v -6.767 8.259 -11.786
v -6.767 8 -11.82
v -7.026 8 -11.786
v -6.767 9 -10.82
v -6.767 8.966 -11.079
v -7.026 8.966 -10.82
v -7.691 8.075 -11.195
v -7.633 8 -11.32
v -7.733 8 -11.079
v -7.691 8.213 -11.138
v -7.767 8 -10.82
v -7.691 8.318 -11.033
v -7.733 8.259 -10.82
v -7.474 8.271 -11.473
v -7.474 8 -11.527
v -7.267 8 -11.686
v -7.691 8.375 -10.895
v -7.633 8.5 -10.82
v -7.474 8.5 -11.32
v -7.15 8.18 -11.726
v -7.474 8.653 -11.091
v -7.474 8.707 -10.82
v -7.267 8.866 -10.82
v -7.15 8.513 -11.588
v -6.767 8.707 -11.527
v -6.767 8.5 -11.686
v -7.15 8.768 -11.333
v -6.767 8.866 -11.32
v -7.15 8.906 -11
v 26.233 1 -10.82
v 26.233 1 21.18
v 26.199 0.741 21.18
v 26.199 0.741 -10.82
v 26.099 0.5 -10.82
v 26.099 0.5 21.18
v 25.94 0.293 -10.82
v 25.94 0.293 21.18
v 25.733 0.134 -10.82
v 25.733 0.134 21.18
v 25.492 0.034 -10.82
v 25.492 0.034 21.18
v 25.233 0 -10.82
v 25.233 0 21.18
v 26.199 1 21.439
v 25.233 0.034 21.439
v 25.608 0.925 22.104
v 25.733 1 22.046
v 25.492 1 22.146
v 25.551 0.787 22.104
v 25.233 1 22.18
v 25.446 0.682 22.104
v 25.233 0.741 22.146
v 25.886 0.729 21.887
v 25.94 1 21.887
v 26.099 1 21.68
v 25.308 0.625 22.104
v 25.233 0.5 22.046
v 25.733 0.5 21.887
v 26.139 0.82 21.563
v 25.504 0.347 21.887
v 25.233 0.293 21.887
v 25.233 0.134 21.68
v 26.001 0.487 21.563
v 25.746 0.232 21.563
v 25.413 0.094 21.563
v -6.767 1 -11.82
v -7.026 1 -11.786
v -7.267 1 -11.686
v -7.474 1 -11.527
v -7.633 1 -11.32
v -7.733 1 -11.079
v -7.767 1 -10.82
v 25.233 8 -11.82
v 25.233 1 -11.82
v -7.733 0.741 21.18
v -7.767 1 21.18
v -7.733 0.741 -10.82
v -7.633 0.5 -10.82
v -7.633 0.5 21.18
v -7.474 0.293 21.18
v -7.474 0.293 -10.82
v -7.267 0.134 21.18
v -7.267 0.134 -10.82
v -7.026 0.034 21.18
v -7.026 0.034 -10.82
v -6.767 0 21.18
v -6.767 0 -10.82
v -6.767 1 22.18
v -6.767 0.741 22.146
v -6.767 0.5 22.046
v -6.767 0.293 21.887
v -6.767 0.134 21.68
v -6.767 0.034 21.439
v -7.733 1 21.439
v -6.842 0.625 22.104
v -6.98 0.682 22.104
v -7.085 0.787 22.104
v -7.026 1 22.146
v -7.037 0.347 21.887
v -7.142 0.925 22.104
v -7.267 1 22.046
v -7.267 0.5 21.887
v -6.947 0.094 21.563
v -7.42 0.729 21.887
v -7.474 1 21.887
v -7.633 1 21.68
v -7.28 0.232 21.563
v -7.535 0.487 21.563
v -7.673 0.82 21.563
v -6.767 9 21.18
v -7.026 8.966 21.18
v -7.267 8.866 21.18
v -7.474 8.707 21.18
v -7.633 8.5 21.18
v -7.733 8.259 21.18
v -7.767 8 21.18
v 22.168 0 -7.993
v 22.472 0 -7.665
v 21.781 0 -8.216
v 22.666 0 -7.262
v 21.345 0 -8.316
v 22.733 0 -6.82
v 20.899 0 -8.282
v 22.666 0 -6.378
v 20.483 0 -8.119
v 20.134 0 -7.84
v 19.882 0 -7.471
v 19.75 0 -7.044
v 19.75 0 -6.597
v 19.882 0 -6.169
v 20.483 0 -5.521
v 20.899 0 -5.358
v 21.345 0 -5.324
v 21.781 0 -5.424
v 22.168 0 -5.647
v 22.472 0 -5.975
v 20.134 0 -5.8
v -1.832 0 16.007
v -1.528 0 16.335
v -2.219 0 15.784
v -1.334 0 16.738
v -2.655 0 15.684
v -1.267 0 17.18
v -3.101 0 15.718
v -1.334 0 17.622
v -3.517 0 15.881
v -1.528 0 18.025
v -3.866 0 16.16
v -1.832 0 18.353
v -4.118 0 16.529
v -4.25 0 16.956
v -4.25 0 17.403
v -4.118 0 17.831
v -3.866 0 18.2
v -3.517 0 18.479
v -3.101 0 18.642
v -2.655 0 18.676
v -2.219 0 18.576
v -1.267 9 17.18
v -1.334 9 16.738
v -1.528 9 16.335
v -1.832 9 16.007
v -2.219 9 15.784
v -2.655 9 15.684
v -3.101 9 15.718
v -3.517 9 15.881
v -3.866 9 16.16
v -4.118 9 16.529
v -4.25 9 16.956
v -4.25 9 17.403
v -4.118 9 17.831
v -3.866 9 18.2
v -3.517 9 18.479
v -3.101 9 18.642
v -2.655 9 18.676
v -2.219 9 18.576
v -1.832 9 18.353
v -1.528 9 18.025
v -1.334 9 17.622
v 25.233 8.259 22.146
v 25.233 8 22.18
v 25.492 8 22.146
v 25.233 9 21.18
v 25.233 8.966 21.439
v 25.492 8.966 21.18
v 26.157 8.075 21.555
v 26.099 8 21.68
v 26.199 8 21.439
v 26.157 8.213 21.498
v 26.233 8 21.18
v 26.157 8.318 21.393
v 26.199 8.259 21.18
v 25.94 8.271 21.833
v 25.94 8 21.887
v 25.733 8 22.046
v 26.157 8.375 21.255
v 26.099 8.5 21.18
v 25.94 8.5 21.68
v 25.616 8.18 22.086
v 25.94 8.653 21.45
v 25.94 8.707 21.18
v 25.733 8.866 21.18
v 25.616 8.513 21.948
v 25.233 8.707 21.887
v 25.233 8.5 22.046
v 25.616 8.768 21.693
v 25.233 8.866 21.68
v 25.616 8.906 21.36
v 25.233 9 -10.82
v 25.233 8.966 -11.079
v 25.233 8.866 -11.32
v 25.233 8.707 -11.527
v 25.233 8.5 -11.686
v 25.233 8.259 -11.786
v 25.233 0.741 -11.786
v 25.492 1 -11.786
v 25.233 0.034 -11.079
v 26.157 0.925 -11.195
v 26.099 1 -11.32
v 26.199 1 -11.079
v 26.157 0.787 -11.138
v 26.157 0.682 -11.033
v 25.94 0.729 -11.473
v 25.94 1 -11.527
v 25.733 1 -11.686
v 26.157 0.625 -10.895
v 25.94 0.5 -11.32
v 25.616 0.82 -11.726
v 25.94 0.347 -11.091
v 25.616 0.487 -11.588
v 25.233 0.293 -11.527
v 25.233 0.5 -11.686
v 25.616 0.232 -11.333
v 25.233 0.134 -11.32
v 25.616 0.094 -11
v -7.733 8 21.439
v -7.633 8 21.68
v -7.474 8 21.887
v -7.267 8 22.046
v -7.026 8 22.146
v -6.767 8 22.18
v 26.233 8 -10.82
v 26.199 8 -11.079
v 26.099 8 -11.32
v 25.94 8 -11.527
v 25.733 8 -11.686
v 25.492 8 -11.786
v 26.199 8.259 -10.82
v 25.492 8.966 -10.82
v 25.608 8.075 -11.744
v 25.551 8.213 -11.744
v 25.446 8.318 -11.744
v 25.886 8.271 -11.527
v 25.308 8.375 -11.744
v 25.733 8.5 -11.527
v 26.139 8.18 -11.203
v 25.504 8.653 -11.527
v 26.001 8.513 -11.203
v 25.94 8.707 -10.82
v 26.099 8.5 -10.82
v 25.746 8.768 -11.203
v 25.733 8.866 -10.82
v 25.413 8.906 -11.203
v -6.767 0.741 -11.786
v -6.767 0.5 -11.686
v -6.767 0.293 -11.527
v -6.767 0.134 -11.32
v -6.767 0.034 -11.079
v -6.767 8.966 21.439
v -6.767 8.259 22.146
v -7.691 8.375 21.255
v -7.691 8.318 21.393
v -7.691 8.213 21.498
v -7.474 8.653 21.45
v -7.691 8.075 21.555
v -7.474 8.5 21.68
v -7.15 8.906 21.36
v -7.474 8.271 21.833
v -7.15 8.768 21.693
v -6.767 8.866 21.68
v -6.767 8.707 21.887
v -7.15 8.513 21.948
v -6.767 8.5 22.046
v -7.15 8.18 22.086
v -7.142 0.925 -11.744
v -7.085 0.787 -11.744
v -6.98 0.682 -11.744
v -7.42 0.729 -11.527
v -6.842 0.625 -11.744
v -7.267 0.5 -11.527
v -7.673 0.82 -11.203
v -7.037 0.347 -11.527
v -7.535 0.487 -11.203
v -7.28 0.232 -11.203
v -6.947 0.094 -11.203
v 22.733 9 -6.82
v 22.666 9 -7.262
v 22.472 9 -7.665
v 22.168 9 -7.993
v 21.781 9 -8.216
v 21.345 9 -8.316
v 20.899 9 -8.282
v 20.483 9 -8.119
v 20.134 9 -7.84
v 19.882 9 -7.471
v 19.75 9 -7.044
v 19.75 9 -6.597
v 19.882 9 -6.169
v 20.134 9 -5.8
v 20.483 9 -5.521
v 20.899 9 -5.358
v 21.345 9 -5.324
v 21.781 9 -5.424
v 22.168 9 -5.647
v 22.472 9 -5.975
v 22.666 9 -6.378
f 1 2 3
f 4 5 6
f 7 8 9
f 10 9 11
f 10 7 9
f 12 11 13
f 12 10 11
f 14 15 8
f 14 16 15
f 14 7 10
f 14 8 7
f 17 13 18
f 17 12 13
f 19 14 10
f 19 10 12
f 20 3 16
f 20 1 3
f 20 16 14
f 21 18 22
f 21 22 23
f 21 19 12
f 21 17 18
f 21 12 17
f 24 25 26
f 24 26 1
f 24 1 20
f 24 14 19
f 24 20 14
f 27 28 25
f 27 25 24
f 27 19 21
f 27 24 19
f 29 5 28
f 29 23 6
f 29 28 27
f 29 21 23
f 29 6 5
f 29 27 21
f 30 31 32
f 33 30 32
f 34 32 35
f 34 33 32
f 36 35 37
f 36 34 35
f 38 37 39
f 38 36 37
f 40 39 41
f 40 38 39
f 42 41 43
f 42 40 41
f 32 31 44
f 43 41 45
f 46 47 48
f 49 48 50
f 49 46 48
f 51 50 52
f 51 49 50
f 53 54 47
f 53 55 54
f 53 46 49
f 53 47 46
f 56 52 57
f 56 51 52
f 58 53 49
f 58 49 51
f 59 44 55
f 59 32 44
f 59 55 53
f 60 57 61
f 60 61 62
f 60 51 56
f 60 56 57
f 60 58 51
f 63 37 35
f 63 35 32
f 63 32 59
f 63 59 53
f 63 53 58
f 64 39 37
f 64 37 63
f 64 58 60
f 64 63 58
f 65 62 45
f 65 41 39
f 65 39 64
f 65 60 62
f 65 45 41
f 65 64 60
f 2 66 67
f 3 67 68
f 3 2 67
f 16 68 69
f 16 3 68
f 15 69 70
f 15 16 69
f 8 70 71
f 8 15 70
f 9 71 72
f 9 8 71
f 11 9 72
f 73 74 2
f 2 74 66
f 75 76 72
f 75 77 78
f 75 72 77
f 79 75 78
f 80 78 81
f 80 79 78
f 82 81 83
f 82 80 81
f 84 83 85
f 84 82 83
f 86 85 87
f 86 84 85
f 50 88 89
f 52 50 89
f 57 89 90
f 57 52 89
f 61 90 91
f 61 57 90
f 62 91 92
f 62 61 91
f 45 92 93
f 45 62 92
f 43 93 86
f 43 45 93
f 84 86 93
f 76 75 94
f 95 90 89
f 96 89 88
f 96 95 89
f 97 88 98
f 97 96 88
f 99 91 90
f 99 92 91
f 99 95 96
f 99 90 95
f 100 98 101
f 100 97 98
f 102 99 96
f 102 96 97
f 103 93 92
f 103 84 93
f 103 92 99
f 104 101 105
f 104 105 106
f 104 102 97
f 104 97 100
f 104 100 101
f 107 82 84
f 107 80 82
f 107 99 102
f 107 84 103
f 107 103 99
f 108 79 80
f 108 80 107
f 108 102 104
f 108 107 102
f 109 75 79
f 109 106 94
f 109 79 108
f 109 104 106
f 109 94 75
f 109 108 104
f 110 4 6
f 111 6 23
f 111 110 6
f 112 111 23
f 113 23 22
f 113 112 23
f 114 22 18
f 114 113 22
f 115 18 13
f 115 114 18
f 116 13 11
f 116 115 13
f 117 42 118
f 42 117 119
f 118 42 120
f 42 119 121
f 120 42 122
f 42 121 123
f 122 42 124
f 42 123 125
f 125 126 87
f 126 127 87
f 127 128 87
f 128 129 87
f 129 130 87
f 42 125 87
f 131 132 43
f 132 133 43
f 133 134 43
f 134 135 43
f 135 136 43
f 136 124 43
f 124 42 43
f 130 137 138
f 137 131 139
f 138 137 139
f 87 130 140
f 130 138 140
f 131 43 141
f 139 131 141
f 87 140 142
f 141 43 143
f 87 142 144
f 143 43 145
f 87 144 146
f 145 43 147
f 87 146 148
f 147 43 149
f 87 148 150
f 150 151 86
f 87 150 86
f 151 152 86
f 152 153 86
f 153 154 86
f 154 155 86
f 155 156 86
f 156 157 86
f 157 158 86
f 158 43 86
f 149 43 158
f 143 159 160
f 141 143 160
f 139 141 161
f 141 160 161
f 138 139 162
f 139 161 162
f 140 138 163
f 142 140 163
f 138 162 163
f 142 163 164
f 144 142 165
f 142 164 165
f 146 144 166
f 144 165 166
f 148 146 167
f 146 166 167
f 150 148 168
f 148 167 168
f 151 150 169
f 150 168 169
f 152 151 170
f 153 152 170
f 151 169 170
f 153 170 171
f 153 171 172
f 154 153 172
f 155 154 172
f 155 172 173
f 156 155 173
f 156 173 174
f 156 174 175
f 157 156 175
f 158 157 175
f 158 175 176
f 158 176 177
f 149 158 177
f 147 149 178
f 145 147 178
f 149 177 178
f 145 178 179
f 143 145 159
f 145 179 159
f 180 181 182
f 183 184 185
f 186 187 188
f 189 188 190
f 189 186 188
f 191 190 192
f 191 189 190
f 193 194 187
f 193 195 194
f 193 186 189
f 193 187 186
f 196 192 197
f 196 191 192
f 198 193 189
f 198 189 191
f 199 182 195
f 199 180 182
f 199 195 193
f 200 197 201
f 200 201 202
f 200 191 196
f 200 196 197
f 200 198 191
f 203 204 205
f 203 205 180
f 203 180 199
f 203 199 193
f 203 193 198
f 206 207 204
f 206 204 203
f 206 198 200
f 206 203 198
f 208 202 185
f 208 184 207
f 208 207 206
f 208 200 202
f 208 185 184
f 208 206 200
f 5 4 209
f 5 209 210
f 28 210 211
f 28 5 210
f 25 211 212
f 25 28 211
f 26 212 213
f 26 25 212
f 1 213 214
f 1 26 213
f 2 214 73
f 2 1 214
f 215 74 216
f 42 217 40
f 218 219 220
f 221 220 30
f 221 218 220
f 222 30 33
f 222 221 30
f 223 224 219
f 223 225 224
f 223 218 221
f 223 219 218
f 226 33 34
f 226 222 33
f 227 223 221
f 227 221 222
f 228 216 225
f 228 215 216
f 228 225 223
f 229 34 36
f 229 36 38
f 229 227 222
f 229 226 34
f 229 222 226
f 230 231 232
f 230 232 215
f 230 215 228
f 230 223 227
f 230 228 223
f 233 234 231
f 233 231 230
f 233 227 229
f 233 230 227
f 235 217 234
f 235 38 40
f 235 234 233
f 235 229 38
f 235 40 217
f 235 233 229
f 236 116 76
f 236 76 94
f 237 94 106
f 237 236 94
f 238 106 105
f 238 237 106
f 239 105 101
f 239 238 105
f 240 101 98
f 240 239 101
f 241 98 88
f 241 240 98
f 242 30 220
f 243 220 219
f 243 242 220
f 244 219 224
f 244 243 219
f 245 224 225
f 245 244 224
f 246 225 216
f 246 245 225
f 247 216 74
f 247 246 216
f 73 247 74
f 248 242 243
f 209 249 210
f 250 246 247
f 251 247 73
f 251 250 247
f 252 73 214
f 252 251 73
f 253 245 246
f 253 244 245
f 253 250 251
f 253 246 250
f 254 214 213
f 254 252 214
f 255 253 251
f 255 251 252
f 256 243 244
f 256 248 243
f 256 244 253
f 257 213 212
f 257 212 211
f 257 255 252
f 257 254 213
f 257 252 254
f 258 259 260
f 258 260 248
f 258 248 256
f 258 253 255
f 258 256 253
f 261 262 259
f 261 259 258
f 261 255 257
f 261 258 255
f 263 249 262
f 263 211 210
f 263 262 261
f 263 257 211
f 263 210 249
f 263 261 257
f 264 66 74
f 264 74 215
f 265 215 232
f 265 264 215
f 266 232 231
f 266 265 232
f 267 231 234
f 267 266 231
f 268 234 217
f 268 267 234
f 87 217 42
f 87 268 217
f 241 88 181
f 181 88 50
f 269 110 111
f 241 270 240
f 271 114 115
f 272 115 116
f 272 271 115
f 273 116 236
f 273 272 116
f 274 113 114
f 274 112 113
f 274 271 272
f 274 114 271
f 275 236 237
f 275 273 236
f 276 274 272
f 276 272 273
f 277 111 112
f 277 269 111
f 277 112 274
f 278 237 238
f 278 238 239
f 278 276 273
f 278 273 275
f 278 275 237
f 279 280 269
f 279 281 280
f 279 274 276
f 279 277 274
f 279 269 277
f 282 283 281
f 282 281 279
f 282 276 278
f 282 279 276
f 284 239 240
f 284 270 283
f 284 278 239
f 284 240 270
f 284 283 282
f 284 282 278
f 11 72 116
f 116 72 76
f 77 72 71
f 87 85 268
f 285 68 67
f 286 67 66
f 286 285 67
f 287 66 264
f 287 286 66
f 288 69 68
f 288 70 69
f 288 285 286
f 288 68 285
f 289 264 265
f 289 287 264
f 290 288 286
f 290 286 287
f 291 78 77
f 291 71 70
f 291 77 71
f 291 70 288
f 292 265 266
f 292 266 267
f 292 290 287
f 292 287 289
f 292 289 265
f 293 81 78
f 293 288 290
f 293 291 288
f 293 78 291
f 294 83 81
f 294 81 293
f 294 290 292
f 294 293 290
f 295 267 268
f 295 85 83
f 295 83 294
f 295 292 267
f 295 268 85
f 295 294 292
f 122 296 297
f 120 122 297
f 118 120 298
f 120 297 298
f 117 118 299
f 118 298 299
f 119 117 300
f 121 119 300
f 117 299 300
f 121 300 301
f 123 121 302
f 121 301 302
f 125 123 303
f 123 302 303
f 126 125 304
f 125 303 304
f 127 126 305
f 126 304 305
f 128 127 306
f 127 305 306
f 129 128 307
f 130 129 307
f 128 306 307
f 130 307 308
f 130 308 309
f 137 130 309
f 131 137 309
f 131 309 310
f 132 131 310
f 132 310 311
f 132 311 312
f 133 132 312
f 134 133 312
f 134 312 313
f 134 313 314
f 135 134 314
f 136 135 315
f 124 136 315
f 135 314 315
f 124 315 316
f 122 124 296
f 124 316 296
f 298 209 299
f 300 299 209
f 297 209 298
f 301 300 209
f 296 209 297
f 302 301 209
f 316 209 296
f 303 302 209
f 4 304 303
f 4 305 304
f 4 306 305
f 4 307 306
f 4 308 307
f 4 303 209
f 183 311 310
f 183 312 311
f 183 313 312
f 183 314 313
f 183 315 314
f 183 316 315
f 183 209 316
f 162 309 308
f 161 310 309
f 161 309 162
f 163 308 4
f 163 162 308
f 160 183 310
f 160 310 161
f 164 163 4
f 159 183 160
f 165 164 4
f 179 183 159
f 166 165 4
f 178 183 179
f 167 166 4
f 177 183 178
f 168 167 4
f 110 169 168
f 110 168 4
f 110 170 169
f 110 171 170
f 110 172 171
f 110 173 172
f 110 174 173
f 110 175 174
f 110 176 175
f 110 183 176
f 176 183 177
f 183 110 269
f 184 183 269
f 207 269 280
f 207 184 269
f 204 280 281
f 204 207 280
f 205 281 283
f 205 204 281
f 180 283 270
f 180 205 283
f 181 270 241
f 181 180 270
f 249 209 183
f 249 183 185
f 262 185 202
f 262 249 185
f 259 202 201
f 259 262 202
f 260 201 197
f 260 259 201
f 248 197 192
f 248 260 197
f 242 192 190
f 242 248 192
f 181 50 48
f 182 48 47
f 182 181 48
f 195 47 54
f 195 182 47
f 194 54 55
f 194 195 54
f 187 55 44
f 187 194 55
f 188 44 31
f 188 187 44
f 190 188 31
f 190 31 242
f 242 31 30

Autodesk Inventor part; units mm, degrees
ref_plane "YZ Plane" through (0, 0, 0) normal (1, 0, 0) x (0, 1, 0)
ref_plane "XZ Plane" through (0, 0, 0) normal (0, 1, 0) x (-1, 0, 0)
ref_plane "XY Plane" through (0, 0, 0) normal (0, 0, 1) x (1, 0, 0)
sketch "Esquisse1" plane through (0, 0, 0) normal (0, 1, 0) x (-1, 0, 0)
  line L0 (7.7669, 22.1799) -> (-26.2331, 22.1799)
  line L1 (-26.2331, 22.1799) -> (-26.2331, -11.8201)
  line L2 (-26.2331, -11.8201) -> (7.7669, -11.8201)
  line L3 (7.7669, -11.8201) -> (7.7669, 22.1799)
  point P0 (0, 0)
  dimension "d0" = 34
  dimension "d1" = 34
extrude "Extrusion1" add sketch "Esquisse1" along normal blind 9
sketch "Esquisse2" plane through (0, 9, 0) normal (0, 1, 0) x (1, 0, 0)
  circle A0 centre (-2.7669, -17.1799) radius 1.5
  circle A1 centre (21.2331, 6.8201) radius 1.5
  line L0 (-7.7669, 11.8201) -> (-7.7669, -22.1799) projected
  line L1 (-7.7669, -22.1799) -> (26.2331, -22.1799) projected
  line L2 (26.2331, 11.8201) -> (-7.7669, 11.8201) projected
  line L3 (26.2331, -22.1799) -> (26.2331, 11.8201) projected
  point P0 (0, 0)
  dimension "d4" = 3
  dimension "d5" = 3
  dimension "d6" = 5
  dimension "d8" = 5
  dimension "d9" = 5
  dimension "d13" = 5
extrude "Extrusion2" cut sketch "Esquisse2" against normal blind 10 contours A0 | A1
fillet "Congé1" radius 1 12 edges at (9.2331, 9, 22.1799) (26.2331, 9, 5.1799) (9.2331, 9, -11.8201) (-7.7669, 9, 5.1799) (-7.7669, 0, 5.1799) (9.2331, 0, -11.8201) (26.2331, 0, 5.1799) (9.2331, 0, 22.1799) (26.2331, 4.5, 22.1799) (26.2331, 4.5, -11.8201) (-7.7669, 4.5, -11.8201) (-7.7669, 4.5, 22.1799)
properties part number "calle-patin"
